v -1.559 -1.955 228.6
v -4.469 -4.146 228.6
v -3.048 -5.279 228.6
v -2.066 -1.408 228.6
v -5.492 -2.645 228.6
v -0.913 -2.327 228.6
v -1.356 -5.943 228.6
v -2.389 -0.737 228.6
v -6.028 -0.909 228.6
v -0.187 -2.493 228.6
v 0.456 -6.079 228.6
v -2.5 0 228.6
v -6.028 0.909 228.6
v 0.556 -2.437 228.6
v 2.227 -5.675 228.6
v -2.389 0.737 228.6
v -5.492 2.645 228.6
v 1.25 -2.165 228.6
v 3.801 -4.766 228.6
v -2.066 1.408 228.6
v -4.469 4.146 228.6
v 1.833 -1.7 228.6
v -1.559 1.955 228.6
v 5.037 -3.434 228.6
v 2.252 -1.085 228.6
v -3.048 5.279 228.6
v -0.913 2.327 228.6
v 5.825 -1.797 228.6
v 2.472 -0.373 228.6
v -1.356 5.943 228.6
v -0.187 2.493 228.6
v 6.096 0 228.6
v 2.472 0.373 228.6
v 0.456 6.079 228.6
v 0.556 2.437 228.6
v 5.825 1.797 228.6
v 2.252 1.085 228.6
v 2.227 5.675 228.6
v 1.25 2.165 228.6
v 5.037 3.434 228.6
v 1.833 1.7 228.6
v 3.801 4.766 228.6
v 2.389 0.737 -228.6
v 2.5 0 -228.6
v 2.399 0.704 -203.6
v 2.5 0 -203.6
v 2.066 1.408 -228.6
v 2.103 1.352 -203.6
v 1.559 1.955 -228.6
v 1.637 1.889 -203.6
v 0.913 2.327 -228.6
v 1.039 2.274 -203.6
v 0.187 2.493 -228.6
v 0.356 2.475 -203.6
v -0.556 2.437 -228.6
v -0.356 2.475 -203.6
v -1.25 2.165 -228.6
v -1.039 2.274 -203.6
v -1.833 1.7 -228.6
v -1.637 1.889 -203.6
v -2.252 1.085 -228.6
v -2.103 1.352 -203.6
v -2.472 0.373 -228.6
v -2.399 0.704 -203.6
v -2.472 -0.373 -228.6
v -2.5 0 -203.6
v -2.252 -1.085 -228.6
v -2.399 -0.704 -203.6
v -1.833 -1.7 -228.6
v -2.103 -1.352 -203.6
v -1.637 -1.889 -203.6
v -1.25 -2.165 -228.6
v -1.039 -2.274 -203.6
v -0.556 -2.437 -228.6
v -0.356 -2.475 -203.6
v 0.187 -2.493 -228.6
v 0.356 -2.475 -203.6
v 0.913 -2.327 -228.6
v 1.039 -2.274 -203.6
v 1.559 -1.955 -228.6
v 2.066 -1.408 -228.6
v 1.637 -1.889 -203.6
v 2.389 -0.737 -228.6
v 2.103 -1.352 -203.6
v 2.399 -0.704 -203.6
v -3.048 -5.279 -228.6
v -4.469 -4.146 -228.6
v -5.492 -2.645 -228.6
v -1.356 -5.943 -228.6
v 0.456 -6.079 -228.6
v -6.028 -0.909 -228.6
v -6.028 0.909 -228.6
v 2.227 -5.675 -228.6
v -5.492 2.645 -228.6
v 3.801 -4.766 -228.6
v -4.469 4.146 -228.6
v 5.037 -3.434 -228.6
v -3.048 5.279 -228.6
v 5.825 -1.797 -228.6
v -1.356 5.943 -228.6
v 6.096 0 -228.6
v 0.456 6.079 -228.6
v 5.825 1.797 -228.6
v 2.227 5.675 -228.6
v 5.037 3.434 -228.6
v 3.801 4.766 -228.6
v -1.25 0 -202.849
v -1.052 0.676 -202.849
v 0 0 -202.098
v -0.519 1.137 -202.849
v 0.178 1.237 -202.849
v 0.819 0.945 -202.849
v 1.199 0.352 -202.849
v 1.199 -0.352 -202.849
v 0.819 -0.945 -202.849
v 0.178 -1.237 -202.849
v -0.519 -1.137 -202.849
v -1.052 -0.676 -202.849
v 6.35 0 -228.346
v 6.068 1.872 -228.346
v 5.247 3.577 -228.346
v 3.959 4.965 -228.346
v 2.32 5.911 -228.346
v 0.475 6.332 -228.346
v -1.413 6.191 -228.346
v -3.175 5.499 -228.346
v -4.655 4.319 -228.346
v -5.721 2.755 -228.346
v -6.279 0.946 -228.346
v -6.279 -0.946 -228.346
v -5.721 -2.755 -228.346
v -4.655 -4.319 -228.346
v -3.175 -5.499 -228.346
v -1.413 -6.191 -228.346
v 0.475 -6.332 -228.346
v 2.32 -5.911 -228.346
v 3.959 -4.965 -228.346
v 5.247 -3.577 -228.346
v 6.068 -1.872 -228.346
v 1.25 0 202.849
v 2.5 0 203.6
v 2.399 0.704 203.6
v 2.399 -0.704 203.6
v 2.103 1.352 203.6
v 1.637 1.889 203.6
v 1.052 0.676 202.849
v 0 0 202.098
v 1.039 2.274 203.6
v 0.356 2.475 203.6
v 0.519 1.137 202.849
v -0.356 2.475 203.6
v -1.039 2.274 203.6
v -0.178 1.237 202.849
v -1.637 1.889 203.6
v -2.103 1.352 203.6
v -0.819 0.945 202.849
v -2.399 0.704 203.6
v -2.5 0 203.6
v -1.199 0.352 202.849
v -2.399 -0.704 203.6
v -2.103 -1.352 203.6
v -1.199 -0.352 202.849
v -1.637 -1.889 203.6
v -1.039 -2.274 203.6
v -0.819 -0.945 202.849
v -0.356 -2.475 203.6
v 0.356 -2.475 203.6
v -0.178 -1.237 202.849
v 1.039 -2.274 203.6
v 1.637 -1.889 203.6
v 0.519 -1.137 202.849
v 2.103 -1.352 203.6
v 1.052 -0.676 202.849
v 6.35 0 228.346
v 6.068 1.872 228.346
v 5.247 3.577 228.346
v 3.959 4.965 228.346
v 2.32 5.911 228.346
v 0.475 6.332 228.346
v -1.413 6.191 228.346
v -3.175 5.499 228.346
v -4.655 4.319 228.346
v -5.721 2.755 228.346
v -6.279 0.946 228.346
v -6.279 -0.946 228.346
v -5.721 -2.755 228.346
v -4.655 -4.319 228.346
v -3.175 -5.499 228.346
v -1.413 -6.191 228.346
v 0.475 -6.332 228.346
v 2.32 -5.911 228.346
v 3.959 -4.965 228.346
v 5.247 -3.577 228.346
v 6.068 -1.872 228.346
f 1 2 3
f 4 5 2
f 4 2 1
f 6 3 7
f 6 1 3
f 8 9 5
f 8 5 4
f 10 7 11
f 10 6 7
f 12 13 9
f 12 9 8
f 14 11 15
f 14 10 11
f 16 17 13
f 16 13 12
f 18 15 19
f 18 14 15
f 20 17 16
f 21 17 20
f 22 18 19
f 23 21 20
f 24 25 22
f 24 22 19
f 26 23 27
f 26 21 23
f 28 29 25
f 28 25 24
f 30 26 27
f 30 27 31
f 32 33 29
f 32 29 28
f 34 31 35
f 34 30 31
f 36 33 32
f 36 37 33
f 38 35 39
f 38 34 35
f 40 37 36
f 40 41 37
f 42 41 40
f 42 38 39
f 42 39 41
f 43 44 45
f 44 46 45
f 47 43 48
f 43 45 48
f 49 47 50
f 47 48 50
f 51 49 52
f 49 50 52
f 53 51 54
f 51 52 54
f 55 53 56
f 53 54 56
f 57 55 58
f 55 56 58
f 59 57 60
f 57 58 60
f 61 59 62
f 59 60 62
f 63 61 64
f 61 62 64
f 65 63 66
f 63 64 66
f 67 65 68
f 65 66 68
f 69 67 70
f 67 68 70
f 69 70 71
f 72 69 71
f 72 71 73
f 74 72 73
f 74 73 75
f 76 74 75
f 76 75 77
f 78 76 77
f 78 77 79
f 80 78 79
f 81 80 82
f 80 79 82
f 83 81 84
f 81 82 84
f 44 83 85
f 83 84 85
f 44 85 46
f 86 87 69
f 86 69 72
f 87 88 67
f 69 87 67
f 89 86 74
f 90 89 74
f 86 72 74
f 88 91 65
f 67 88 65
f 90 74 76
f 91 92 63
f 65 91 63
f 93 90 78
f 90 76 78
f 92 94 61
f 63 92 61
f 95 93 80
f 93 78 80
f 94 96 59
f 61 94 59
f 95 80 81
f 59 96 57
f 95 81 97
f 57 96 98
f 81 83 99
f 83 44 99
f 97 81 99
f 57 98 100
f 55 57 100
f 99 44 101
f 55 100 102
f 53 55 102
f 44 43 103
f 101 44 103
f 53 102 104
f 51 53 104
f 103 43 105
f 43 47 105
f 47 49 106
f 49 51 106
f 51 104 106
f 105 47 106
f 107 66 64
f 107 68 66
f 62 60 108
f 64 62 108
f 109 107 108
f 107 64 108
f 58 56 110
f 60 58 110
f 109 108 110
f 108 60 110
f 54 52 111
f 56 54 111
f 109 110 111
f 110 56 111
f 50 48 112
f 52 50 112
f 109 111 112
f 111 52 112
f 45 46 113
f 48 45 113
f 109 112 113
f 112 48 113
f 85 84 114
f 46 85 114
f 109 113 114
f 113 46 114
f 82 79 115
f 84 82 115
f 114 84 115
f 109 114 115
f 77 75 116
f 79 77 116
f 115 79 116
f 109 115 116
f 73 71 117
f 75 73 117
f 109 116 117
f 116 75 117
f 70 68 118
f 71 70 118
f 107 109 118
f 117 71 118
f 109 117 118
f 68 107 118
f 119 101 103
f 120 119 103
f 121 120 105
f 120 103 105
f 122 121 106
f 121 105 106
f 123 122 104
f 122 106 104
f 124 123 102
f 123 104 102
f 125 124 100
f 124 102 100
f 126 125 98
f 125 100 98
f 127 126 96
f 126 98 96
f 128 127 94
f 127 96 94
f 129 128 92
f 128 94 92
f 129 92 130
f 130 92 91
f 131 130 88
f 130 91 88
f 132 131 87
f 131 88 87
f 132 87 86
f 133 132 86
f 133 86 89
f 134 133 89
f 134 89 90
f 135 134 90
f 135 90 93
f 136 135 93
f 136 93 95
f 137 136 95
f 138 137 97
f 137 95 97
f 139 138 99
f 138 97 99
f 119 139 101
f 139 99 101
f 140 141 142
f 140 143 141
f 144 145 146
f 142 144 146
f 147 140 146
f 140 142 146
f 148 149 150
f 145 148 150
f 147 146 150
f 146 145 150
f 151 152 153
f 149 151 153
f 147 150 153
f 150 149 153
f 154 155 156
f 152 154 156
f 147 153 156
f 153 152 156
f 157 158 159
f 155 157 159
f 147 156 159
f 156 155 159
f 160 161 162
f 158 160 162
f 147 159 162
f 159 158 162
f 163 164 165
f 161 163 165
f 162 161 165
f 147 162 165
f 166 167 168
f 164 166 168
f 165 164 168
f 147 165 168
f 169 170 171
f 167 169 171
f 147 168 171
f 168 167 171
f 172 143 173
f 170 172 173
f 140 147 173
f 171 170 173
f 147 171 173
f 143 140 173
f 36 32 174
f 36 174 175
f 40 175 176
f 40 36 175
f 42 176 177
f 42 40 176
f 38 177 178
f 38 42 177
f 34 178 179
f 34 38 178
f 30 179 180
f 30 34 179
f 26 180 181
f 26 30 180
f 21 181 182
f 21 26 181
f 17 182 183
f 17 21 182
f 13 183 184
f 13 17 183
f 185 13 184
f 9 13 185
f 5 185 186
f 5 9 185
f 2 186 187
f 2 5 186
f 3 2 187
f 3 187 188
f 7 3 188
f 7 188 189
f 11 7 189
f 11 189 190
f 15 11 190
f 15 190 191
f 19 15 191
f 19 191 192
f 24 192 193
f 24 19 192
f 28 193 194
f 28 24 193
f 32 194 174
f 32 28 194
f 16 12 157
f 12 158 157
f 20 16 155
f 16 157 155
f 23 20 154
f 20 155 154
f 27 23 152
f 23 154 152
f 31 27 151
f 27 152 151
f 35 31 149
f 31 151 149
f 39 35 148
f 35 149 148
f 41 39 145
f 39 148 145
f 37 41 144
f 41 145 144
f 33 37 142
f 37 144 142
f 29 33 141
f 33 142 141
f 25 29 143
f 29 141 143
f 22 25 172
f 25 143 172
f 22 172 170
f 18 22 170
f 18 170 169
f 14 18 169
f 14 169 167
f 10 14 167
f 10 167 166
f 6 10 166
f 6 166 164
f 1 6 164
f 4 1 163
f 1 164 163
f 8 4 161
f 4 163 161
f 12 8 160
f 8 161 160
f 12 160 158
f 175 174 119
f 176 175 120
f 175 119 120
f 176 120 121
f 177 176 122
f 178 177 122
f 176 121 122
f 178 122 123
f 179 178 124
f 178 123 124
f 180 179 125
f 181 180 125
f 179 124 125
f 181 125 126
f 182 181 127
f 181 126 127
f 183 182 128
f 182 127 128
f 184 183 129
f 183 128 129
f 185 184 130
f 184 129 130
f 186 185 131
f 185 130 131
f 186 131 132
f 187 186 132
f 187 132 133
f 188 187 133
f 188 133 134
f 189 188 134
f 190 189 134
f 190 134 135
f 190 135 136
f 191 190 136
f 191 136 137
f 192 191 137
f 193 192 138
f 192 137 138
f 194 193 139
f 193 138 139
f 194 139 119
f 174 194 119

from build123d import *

# Parameters (mm, degrees)
BOSS_EXTRUDE1_DEPTH                 = 228.6
BOSS_EXTRUDE1_DEPTH_BACK            = 228.6
SKETCH3_R                           = 6.35
CHAMFER1_SIZE                       = 0.254
M6X1_0_TAPPED_HOLE1_D               = 5
M6X1_0_TAPPED_HOLE1_DEPTH           = 25
M6X1_0_TAPPED_HOLE1_TIP             = 1.502151548
M6X1_0_TAPPED_HOLE1_ON_FACE_2_D     = 5
M6X1_0_TAPPED_HOLE1_ON_FACE_2_DEPTH = 25
M6X1_0_TAPPED_HOLE1_ON_FACE_2_TIP   = 1.502151548


with BuildPart() as part:
    # Sketch3 → Boss-Extrude1 (new, two sides: drawn at the far end of the back side and taken through both)
    with BuildSketch(Plane.XY.offset(-BOSS_EXTRUDE1_DEPTH_BACK)):
        Circle(SKETCH3_R)
    extrude(amount=BOSS_EXTRUDE1_DEPTH + BOSS_EXTRUDE1_DEPTH_BACK)

    # Chamfer1
    chamfer1_edges = [part.edges().sort_by_distance(p)[0] for p in [
        (-6.35, 0, -228.6),
        (-6.35, 0, 228.6),
    ]]
    chamfer(chamfer1_edges, length=CHAMFER1_SIZE)

    # M6x1.0 Tapped Hole1
    with Locations(Plane(origin=(0, 0, -228.6), x_dir=(-1, 0, 0), z_dir=(0, 0, -1))):
        with Locations((0, 0)):
            Hole(M6X1_0_TAPPED_HOLE1_D / 2, depth=M6X1_0_TAPPED_HOLE1_DEPTH)
            with Locations((0, 0, -(M6X1_0_TAPPED_HOLE1_DEPTH + M6X1_0_TAPPED_HOLE1_TIP / 2))):  # 118° drill point
                Cone(0, M6X1_0_TAPPED_HOLE1_D / 2, M6X1_0_TAPPED_HOLE1_TIP, mode=Mode.SUBTRACT)

    # M6x1.0 Tapped Hole1 on face 2
    with Locations(Plane.XY.offset(228.6)):
        with Locations((0, 0)):
            Hole(M6X1_0_TAPPED_HOLE1_ON_FACE_2_D / 2, depth=M6X1_0_TAPPED_HOLE1_ON_FACE_2_DEPTH)
            with Locations((0, 0, -(M6X1_0_TAPPED_HOLE1_ON_FACE_2_DEPTH + M6X1_0_TAPPED_HOLE1_ON_FACE_2_TIP / 2))):  # 118° drill point
                Cone(0, M6X1_0_TAPPED_HOLE1_ON_FACE_2_D / 2, M6X1_0_TAPPED_HOLE1_ON_FACE_2_TIP, mode=Mode.SUBTRACT)


solid = part.part
